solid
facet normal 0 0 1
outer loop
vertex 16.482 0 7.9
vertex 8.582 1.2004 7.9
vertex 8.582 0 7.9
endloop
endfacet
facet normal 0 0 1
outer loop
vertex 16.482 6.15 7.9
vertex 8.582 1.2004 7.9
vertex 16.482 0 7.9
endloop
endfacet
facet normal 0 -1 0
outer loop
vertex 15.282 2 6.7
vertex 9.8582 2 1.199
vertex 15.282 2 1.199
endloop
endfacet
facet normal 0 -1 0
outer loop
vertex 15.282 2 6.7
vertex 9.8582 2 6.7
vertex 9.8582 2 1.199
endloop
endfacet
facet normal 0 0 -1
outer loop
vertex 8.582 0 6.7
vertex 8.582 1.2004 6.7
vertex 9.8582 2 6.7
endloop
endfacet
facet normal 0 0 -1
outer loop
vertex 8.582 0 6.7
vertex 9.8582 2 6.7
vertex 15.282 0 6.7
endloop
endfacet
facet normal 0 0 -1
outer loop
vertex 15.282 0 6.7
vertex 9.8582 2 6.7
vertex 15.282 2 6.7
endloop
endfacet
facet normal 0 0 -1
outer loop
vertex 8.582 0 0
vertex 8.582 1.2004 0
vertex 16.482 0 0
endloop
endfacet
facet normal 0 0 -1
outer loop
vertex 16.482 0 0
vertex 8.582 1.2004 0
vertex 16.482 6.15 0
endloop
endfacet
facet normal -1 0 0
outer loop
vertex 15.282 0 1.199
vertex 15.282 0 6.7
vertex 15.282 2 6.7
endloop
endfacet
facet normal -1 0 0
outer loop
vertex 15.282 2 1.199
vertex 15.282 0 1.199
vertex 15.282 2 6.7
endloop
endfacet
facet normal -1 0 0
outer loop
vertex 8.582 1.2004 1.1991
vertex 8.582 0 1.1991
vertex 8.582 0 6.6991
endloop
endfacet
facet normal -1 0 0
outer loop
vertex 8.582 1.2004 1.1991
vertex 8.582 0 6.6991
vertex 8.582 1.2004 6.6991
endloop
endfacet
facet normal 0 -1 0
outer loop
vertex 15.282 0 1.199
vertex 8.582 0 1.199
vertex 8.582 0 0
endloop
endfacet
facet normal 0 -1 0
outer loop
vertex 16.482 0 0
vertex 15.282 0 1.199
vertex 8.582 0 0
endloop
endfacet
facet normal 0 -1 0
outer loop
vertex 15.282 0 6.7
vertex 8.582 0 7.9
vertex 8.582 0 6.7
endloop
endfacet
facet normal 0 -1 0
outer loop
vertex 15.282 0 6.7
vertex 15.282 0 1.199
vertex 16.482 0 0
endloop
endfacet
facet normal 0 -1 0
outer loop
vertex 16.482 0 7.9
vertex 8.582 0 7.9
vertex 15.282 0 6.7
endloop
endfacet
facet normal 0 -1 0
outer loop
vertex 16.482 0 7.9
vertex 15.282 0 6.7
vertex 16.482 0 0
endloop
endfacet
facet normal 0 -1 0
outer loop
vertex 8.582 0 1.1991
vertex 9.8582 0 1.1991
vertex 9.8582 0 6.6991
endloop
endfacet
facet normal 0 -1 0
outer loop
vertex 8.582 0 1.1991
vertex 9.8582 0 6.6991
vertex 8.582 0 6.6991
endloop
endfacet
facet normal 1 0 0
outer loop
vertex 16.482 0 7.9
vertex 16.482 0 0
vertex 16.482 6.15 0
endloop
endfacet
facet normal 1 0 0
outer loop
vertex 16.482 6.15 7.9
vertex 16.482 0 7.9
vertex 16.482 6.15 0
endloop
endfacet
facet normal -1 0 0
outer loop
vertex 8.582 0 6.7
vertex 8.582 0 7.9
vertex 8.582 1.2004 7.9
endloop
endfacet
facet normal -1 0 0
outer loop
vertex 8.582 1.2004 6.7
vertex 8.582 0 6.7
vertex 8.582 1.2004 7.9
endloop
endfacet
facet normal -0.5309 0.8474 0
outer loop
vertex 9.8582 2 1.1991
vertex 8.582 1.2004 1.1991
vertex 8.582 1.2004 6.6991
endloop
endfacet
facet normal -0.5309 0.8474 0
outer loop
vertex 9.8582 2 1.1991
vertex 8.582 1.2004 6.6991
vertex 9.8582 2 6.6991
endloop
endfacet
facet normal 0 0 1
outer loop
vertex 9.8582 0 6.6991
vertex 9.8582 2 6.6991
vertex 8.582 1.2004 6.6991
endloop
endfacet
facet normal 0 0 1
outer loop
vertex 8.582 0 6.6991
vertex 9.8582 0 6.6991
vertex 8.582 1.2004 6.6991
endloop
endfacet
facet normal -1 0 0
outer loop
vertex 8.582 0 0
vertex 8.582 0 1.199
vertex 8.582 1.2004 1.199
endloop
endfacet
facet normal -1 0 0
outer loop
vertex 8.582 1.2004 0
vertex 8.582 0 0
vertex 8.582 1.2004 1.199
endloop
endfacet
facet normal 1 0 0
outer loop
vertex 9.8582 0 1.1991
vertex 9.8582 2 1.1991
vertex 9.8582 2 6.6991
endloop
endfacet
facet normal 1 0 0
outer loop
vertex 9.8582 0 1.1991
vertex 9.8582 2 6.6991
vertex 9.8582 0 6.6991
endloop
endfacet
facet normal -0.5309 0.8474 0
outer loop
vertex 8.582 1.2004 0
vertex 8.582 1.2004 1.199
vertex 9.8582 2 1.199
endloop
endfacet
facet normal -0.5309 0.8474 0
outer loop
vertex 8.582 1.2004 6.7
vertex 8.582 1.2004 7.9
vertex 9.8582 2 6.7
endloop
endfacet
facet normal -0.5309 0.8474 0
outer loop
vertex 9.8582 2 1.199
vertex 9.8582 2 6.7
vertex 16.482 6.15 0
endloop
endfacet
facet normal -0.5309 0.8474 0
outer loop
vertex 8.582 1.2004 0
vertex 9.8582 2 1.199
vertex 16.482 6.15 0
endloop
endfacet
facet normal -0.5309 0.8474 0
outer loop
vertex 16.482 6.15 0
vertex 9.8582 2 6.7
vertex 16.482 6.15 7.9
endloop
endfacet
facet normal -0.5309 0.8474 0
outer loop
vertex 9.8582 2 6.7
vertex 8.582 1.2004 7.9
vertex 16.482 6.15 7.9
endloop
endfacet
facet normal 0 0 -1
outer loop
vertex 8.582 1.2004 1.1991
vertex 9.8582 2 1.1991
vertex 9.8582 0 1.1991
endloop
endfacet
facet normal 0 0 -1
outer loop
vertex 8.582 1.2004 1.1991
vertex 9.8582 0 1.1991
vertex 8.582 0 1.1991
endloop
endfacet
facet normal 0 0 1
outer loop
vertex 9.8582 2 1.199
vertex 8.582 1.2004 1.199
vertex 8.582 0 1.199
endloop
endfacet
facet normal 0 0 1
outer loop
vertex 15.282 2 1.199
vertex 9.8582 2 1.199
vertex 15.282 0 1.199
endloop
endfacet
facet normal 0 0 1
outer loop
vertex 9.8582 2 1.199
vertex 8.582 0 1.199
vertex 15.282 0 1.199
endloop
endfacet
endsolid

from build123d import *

# Parameters (mm, degrees)
MAINBASESKETCH_W          = 15.8
MAINBASESKETCH_H          = 3.2
MAINBASEEXTRUDE_DEPTH     = 7.9
STUDSSKETCH_R             = 2.4
STUDSEXTRUDE_DEPTH        = 1.6
MAINBASESHELL_T           = -1.2
LCUTBLUE_DEPTH            = 19.555463972
LCUTBLUE_DEPTH_BACK       = 19.555463972
CUTADDEDTOLCUT_DEPTH      = 2
MADESLIMCUTSKETCH_W       = 7.9
MADESLIMCUTSKETCH_H       = 7.9
MADESLIMCUT_DEPTH         = 19.897228453
MADESLIMFILLEXT_REACH     = 20.555
SKETCH33_W                = 5.500952983
SKETCH33_H                = 1.199047018
ANGLEDSLIMBASECUT_DEPTH   = 19.555463972
ANGLEDSLIMBASESWEEP_DEPTH = 7.9
CUT_EXTRUDE24_DEPTH       = 20.284391181
BOSS_EXTRUDE17_START      = 0.0001
BOSS_EXTRUDE17_DEPTH      = 5.5


# Read off the part's stored shape, not the designer's step: AngledSlimBaseSweep
with BuildPart() as part:
    # MainBaseSketch → MainBaseExtrude (new, symmetric)
    with BuildSketch(Plane.XY):
        with Locations((8.581967213, 1.6)):
            Rectangle(MAINBASESKETCH_W, MAINBASESKETCH_H)
    extrude(amount=MAINBASEEXTRUDE_DEPTH, both=True)

    # StudsSketch → StudsExtrude (add)
    with BuildSketch(Plane(origin=(0, 3.2, 0), x_dir=(1, 0, 0), z_dir=(0, 1, 0))):
        with Locations((4.581967213, 4)):
            Circle(STUDSSKETCH_R)
    extrude(amount=STUDSEXTRUDE_DEPTH)

    # MainBaseShell
    mainbaseshell_openings = [part.faces().sort_by_distance(p)[0] for p in [
        (8.581967213, 0, 0),
    ]]
    offset(amount=MAINBASESHELL_T, openings=mainbaseshell_openings, kind=Kind.INTERSECTION)

    # LCUTBlueSketch → LCutBlue (cut, two sides: drawn at the far end of the back side and taken through both)
    with BuildSketch(Plane(origin=(0, 3.2, 0), x_dir=(1, 0, 0), z_dir=(0, 1, 0)).offset(-LCUTBLUE_DEPTH_BACK)):
        Polygon((8.581967213, 53.229874044), (8.581967213, 7.9), (8.581967213, 0), (16.481967213, 0), (61.811841258, 0), (125.917963912, 64.106122654), (72.688089868, 117.335996699), align=None)
    extrude(amount=LCUTBLUE_DEPTH + LCUTBLUE_DEPTH_BACK, mode=Mode.SUBTRACT)

    # CutAddedtoLSketch → CutAddedToLCut (add)
    with BuildSketch(Plane.XZ):
        Polygon((7.382920196, -6.7), (8.581967213, -6.7), (8.581967213, 0), (15.281967213, 0), (15.281967213, 1.199047018), (7.382920196, 1.199047018), (7.382920196, 0), align=None)
    extrude(amount=-CUTADDEDTOLCUT_DEPTH)

    # MadeSlimCutSketch → MadeSlimCut (cut, through all)
    with BuildSketch(Plane.XZ):
        with Locations((4.631967213, -3.95)):
            Rectangle(MADESLIMCUTSKETCH_W, MADESLIMCUTSKETCH_H)
    extrude(amount=-MADESLIMCUT_DEPTH, mode=Mode.SUBTRACT)

    # Sketch33 → MadeSlimFillExt (add, up to next)
    with BuildSketch(Plane.XZ, mode=Mode.PRIVATE) as madeslimfillext_sk1:
        with Locations((4.632443704, 0.599523509)):
            Rectangle(SKETCH33_W, SKETCH33_H)
    madeslimfillext_tool1 = extrude(madeslimfillext_sk1.sketch, amount=-MADESLIMFILLEXT_REACH, mode=Mode.PRIVATE) - part.part
    add(madeslimfillext_tool1.solids().sort_by_distance((4.632444, 0, 0.599524))[0])

    # AngledSlimBaseSketch → AngledSlimBaseCut (cut, through all)
    with BuildSketch(Plane.XY.offset(7.9)):
        Polygon((16.481967213, 6.15), (0.681967213, 2.247699421), (16.481967213, 2.247699421), align=None)
    extrude(amount=-ANGLEDSLIMBASECUT_DEPTH, mode=Mode.SUBTRACT)


with BuildPart() as body_2:
    # of the pieces the cut leaves, the one that is kept (angledslimbasecut_keep)
    add(part.part.solids().sort_by_distance((0.681967213, 0, 7.9))[0])

    # AngledSlimBaseSweep outline → AngledSlimBaseSweep (add)
    with BuildSketch(Plane.XY):
        Polygon((16.481967213, 2.247699421), (16.481967213, 6.15), (0.681967213, 2.247699421), align=None)
    extrude(amount=ANGLEDSLIMBASESWEEP_DEPTH)

    # Sketch89 → Cut-Extrude24 (cut, through all)
    with BuildSketch(Plane.XY.offset(7.9)):
        Polygon((8.581967213, 0), (8.581967213, 1.200372495), (16.481967213, 6.15), (0.681967213, 2.247699421), (0.681967213, 0), align=None)
    extrude(amount=-CUT_EXTRUDE24_DEPTH, mode=Mode.SUBTRACT)


with BuildPart() as body_2_2:
    # Sketch93 → Boss-Extrude17 (new body)
    with BuildSketch(Plane.XY.offset(1.199047018).offset(BOSS_EXTRUDE17_START)):
        Polygon((8.581967213, 1.200372495), (9.858236444, 2), (9.858236444, 0), (8.581967213, 0), align=None)
    extrude(amount=BOSS_EXTRUDE17_DEPTH)


solid = Compound([body_2.part, body_2_2.part])
